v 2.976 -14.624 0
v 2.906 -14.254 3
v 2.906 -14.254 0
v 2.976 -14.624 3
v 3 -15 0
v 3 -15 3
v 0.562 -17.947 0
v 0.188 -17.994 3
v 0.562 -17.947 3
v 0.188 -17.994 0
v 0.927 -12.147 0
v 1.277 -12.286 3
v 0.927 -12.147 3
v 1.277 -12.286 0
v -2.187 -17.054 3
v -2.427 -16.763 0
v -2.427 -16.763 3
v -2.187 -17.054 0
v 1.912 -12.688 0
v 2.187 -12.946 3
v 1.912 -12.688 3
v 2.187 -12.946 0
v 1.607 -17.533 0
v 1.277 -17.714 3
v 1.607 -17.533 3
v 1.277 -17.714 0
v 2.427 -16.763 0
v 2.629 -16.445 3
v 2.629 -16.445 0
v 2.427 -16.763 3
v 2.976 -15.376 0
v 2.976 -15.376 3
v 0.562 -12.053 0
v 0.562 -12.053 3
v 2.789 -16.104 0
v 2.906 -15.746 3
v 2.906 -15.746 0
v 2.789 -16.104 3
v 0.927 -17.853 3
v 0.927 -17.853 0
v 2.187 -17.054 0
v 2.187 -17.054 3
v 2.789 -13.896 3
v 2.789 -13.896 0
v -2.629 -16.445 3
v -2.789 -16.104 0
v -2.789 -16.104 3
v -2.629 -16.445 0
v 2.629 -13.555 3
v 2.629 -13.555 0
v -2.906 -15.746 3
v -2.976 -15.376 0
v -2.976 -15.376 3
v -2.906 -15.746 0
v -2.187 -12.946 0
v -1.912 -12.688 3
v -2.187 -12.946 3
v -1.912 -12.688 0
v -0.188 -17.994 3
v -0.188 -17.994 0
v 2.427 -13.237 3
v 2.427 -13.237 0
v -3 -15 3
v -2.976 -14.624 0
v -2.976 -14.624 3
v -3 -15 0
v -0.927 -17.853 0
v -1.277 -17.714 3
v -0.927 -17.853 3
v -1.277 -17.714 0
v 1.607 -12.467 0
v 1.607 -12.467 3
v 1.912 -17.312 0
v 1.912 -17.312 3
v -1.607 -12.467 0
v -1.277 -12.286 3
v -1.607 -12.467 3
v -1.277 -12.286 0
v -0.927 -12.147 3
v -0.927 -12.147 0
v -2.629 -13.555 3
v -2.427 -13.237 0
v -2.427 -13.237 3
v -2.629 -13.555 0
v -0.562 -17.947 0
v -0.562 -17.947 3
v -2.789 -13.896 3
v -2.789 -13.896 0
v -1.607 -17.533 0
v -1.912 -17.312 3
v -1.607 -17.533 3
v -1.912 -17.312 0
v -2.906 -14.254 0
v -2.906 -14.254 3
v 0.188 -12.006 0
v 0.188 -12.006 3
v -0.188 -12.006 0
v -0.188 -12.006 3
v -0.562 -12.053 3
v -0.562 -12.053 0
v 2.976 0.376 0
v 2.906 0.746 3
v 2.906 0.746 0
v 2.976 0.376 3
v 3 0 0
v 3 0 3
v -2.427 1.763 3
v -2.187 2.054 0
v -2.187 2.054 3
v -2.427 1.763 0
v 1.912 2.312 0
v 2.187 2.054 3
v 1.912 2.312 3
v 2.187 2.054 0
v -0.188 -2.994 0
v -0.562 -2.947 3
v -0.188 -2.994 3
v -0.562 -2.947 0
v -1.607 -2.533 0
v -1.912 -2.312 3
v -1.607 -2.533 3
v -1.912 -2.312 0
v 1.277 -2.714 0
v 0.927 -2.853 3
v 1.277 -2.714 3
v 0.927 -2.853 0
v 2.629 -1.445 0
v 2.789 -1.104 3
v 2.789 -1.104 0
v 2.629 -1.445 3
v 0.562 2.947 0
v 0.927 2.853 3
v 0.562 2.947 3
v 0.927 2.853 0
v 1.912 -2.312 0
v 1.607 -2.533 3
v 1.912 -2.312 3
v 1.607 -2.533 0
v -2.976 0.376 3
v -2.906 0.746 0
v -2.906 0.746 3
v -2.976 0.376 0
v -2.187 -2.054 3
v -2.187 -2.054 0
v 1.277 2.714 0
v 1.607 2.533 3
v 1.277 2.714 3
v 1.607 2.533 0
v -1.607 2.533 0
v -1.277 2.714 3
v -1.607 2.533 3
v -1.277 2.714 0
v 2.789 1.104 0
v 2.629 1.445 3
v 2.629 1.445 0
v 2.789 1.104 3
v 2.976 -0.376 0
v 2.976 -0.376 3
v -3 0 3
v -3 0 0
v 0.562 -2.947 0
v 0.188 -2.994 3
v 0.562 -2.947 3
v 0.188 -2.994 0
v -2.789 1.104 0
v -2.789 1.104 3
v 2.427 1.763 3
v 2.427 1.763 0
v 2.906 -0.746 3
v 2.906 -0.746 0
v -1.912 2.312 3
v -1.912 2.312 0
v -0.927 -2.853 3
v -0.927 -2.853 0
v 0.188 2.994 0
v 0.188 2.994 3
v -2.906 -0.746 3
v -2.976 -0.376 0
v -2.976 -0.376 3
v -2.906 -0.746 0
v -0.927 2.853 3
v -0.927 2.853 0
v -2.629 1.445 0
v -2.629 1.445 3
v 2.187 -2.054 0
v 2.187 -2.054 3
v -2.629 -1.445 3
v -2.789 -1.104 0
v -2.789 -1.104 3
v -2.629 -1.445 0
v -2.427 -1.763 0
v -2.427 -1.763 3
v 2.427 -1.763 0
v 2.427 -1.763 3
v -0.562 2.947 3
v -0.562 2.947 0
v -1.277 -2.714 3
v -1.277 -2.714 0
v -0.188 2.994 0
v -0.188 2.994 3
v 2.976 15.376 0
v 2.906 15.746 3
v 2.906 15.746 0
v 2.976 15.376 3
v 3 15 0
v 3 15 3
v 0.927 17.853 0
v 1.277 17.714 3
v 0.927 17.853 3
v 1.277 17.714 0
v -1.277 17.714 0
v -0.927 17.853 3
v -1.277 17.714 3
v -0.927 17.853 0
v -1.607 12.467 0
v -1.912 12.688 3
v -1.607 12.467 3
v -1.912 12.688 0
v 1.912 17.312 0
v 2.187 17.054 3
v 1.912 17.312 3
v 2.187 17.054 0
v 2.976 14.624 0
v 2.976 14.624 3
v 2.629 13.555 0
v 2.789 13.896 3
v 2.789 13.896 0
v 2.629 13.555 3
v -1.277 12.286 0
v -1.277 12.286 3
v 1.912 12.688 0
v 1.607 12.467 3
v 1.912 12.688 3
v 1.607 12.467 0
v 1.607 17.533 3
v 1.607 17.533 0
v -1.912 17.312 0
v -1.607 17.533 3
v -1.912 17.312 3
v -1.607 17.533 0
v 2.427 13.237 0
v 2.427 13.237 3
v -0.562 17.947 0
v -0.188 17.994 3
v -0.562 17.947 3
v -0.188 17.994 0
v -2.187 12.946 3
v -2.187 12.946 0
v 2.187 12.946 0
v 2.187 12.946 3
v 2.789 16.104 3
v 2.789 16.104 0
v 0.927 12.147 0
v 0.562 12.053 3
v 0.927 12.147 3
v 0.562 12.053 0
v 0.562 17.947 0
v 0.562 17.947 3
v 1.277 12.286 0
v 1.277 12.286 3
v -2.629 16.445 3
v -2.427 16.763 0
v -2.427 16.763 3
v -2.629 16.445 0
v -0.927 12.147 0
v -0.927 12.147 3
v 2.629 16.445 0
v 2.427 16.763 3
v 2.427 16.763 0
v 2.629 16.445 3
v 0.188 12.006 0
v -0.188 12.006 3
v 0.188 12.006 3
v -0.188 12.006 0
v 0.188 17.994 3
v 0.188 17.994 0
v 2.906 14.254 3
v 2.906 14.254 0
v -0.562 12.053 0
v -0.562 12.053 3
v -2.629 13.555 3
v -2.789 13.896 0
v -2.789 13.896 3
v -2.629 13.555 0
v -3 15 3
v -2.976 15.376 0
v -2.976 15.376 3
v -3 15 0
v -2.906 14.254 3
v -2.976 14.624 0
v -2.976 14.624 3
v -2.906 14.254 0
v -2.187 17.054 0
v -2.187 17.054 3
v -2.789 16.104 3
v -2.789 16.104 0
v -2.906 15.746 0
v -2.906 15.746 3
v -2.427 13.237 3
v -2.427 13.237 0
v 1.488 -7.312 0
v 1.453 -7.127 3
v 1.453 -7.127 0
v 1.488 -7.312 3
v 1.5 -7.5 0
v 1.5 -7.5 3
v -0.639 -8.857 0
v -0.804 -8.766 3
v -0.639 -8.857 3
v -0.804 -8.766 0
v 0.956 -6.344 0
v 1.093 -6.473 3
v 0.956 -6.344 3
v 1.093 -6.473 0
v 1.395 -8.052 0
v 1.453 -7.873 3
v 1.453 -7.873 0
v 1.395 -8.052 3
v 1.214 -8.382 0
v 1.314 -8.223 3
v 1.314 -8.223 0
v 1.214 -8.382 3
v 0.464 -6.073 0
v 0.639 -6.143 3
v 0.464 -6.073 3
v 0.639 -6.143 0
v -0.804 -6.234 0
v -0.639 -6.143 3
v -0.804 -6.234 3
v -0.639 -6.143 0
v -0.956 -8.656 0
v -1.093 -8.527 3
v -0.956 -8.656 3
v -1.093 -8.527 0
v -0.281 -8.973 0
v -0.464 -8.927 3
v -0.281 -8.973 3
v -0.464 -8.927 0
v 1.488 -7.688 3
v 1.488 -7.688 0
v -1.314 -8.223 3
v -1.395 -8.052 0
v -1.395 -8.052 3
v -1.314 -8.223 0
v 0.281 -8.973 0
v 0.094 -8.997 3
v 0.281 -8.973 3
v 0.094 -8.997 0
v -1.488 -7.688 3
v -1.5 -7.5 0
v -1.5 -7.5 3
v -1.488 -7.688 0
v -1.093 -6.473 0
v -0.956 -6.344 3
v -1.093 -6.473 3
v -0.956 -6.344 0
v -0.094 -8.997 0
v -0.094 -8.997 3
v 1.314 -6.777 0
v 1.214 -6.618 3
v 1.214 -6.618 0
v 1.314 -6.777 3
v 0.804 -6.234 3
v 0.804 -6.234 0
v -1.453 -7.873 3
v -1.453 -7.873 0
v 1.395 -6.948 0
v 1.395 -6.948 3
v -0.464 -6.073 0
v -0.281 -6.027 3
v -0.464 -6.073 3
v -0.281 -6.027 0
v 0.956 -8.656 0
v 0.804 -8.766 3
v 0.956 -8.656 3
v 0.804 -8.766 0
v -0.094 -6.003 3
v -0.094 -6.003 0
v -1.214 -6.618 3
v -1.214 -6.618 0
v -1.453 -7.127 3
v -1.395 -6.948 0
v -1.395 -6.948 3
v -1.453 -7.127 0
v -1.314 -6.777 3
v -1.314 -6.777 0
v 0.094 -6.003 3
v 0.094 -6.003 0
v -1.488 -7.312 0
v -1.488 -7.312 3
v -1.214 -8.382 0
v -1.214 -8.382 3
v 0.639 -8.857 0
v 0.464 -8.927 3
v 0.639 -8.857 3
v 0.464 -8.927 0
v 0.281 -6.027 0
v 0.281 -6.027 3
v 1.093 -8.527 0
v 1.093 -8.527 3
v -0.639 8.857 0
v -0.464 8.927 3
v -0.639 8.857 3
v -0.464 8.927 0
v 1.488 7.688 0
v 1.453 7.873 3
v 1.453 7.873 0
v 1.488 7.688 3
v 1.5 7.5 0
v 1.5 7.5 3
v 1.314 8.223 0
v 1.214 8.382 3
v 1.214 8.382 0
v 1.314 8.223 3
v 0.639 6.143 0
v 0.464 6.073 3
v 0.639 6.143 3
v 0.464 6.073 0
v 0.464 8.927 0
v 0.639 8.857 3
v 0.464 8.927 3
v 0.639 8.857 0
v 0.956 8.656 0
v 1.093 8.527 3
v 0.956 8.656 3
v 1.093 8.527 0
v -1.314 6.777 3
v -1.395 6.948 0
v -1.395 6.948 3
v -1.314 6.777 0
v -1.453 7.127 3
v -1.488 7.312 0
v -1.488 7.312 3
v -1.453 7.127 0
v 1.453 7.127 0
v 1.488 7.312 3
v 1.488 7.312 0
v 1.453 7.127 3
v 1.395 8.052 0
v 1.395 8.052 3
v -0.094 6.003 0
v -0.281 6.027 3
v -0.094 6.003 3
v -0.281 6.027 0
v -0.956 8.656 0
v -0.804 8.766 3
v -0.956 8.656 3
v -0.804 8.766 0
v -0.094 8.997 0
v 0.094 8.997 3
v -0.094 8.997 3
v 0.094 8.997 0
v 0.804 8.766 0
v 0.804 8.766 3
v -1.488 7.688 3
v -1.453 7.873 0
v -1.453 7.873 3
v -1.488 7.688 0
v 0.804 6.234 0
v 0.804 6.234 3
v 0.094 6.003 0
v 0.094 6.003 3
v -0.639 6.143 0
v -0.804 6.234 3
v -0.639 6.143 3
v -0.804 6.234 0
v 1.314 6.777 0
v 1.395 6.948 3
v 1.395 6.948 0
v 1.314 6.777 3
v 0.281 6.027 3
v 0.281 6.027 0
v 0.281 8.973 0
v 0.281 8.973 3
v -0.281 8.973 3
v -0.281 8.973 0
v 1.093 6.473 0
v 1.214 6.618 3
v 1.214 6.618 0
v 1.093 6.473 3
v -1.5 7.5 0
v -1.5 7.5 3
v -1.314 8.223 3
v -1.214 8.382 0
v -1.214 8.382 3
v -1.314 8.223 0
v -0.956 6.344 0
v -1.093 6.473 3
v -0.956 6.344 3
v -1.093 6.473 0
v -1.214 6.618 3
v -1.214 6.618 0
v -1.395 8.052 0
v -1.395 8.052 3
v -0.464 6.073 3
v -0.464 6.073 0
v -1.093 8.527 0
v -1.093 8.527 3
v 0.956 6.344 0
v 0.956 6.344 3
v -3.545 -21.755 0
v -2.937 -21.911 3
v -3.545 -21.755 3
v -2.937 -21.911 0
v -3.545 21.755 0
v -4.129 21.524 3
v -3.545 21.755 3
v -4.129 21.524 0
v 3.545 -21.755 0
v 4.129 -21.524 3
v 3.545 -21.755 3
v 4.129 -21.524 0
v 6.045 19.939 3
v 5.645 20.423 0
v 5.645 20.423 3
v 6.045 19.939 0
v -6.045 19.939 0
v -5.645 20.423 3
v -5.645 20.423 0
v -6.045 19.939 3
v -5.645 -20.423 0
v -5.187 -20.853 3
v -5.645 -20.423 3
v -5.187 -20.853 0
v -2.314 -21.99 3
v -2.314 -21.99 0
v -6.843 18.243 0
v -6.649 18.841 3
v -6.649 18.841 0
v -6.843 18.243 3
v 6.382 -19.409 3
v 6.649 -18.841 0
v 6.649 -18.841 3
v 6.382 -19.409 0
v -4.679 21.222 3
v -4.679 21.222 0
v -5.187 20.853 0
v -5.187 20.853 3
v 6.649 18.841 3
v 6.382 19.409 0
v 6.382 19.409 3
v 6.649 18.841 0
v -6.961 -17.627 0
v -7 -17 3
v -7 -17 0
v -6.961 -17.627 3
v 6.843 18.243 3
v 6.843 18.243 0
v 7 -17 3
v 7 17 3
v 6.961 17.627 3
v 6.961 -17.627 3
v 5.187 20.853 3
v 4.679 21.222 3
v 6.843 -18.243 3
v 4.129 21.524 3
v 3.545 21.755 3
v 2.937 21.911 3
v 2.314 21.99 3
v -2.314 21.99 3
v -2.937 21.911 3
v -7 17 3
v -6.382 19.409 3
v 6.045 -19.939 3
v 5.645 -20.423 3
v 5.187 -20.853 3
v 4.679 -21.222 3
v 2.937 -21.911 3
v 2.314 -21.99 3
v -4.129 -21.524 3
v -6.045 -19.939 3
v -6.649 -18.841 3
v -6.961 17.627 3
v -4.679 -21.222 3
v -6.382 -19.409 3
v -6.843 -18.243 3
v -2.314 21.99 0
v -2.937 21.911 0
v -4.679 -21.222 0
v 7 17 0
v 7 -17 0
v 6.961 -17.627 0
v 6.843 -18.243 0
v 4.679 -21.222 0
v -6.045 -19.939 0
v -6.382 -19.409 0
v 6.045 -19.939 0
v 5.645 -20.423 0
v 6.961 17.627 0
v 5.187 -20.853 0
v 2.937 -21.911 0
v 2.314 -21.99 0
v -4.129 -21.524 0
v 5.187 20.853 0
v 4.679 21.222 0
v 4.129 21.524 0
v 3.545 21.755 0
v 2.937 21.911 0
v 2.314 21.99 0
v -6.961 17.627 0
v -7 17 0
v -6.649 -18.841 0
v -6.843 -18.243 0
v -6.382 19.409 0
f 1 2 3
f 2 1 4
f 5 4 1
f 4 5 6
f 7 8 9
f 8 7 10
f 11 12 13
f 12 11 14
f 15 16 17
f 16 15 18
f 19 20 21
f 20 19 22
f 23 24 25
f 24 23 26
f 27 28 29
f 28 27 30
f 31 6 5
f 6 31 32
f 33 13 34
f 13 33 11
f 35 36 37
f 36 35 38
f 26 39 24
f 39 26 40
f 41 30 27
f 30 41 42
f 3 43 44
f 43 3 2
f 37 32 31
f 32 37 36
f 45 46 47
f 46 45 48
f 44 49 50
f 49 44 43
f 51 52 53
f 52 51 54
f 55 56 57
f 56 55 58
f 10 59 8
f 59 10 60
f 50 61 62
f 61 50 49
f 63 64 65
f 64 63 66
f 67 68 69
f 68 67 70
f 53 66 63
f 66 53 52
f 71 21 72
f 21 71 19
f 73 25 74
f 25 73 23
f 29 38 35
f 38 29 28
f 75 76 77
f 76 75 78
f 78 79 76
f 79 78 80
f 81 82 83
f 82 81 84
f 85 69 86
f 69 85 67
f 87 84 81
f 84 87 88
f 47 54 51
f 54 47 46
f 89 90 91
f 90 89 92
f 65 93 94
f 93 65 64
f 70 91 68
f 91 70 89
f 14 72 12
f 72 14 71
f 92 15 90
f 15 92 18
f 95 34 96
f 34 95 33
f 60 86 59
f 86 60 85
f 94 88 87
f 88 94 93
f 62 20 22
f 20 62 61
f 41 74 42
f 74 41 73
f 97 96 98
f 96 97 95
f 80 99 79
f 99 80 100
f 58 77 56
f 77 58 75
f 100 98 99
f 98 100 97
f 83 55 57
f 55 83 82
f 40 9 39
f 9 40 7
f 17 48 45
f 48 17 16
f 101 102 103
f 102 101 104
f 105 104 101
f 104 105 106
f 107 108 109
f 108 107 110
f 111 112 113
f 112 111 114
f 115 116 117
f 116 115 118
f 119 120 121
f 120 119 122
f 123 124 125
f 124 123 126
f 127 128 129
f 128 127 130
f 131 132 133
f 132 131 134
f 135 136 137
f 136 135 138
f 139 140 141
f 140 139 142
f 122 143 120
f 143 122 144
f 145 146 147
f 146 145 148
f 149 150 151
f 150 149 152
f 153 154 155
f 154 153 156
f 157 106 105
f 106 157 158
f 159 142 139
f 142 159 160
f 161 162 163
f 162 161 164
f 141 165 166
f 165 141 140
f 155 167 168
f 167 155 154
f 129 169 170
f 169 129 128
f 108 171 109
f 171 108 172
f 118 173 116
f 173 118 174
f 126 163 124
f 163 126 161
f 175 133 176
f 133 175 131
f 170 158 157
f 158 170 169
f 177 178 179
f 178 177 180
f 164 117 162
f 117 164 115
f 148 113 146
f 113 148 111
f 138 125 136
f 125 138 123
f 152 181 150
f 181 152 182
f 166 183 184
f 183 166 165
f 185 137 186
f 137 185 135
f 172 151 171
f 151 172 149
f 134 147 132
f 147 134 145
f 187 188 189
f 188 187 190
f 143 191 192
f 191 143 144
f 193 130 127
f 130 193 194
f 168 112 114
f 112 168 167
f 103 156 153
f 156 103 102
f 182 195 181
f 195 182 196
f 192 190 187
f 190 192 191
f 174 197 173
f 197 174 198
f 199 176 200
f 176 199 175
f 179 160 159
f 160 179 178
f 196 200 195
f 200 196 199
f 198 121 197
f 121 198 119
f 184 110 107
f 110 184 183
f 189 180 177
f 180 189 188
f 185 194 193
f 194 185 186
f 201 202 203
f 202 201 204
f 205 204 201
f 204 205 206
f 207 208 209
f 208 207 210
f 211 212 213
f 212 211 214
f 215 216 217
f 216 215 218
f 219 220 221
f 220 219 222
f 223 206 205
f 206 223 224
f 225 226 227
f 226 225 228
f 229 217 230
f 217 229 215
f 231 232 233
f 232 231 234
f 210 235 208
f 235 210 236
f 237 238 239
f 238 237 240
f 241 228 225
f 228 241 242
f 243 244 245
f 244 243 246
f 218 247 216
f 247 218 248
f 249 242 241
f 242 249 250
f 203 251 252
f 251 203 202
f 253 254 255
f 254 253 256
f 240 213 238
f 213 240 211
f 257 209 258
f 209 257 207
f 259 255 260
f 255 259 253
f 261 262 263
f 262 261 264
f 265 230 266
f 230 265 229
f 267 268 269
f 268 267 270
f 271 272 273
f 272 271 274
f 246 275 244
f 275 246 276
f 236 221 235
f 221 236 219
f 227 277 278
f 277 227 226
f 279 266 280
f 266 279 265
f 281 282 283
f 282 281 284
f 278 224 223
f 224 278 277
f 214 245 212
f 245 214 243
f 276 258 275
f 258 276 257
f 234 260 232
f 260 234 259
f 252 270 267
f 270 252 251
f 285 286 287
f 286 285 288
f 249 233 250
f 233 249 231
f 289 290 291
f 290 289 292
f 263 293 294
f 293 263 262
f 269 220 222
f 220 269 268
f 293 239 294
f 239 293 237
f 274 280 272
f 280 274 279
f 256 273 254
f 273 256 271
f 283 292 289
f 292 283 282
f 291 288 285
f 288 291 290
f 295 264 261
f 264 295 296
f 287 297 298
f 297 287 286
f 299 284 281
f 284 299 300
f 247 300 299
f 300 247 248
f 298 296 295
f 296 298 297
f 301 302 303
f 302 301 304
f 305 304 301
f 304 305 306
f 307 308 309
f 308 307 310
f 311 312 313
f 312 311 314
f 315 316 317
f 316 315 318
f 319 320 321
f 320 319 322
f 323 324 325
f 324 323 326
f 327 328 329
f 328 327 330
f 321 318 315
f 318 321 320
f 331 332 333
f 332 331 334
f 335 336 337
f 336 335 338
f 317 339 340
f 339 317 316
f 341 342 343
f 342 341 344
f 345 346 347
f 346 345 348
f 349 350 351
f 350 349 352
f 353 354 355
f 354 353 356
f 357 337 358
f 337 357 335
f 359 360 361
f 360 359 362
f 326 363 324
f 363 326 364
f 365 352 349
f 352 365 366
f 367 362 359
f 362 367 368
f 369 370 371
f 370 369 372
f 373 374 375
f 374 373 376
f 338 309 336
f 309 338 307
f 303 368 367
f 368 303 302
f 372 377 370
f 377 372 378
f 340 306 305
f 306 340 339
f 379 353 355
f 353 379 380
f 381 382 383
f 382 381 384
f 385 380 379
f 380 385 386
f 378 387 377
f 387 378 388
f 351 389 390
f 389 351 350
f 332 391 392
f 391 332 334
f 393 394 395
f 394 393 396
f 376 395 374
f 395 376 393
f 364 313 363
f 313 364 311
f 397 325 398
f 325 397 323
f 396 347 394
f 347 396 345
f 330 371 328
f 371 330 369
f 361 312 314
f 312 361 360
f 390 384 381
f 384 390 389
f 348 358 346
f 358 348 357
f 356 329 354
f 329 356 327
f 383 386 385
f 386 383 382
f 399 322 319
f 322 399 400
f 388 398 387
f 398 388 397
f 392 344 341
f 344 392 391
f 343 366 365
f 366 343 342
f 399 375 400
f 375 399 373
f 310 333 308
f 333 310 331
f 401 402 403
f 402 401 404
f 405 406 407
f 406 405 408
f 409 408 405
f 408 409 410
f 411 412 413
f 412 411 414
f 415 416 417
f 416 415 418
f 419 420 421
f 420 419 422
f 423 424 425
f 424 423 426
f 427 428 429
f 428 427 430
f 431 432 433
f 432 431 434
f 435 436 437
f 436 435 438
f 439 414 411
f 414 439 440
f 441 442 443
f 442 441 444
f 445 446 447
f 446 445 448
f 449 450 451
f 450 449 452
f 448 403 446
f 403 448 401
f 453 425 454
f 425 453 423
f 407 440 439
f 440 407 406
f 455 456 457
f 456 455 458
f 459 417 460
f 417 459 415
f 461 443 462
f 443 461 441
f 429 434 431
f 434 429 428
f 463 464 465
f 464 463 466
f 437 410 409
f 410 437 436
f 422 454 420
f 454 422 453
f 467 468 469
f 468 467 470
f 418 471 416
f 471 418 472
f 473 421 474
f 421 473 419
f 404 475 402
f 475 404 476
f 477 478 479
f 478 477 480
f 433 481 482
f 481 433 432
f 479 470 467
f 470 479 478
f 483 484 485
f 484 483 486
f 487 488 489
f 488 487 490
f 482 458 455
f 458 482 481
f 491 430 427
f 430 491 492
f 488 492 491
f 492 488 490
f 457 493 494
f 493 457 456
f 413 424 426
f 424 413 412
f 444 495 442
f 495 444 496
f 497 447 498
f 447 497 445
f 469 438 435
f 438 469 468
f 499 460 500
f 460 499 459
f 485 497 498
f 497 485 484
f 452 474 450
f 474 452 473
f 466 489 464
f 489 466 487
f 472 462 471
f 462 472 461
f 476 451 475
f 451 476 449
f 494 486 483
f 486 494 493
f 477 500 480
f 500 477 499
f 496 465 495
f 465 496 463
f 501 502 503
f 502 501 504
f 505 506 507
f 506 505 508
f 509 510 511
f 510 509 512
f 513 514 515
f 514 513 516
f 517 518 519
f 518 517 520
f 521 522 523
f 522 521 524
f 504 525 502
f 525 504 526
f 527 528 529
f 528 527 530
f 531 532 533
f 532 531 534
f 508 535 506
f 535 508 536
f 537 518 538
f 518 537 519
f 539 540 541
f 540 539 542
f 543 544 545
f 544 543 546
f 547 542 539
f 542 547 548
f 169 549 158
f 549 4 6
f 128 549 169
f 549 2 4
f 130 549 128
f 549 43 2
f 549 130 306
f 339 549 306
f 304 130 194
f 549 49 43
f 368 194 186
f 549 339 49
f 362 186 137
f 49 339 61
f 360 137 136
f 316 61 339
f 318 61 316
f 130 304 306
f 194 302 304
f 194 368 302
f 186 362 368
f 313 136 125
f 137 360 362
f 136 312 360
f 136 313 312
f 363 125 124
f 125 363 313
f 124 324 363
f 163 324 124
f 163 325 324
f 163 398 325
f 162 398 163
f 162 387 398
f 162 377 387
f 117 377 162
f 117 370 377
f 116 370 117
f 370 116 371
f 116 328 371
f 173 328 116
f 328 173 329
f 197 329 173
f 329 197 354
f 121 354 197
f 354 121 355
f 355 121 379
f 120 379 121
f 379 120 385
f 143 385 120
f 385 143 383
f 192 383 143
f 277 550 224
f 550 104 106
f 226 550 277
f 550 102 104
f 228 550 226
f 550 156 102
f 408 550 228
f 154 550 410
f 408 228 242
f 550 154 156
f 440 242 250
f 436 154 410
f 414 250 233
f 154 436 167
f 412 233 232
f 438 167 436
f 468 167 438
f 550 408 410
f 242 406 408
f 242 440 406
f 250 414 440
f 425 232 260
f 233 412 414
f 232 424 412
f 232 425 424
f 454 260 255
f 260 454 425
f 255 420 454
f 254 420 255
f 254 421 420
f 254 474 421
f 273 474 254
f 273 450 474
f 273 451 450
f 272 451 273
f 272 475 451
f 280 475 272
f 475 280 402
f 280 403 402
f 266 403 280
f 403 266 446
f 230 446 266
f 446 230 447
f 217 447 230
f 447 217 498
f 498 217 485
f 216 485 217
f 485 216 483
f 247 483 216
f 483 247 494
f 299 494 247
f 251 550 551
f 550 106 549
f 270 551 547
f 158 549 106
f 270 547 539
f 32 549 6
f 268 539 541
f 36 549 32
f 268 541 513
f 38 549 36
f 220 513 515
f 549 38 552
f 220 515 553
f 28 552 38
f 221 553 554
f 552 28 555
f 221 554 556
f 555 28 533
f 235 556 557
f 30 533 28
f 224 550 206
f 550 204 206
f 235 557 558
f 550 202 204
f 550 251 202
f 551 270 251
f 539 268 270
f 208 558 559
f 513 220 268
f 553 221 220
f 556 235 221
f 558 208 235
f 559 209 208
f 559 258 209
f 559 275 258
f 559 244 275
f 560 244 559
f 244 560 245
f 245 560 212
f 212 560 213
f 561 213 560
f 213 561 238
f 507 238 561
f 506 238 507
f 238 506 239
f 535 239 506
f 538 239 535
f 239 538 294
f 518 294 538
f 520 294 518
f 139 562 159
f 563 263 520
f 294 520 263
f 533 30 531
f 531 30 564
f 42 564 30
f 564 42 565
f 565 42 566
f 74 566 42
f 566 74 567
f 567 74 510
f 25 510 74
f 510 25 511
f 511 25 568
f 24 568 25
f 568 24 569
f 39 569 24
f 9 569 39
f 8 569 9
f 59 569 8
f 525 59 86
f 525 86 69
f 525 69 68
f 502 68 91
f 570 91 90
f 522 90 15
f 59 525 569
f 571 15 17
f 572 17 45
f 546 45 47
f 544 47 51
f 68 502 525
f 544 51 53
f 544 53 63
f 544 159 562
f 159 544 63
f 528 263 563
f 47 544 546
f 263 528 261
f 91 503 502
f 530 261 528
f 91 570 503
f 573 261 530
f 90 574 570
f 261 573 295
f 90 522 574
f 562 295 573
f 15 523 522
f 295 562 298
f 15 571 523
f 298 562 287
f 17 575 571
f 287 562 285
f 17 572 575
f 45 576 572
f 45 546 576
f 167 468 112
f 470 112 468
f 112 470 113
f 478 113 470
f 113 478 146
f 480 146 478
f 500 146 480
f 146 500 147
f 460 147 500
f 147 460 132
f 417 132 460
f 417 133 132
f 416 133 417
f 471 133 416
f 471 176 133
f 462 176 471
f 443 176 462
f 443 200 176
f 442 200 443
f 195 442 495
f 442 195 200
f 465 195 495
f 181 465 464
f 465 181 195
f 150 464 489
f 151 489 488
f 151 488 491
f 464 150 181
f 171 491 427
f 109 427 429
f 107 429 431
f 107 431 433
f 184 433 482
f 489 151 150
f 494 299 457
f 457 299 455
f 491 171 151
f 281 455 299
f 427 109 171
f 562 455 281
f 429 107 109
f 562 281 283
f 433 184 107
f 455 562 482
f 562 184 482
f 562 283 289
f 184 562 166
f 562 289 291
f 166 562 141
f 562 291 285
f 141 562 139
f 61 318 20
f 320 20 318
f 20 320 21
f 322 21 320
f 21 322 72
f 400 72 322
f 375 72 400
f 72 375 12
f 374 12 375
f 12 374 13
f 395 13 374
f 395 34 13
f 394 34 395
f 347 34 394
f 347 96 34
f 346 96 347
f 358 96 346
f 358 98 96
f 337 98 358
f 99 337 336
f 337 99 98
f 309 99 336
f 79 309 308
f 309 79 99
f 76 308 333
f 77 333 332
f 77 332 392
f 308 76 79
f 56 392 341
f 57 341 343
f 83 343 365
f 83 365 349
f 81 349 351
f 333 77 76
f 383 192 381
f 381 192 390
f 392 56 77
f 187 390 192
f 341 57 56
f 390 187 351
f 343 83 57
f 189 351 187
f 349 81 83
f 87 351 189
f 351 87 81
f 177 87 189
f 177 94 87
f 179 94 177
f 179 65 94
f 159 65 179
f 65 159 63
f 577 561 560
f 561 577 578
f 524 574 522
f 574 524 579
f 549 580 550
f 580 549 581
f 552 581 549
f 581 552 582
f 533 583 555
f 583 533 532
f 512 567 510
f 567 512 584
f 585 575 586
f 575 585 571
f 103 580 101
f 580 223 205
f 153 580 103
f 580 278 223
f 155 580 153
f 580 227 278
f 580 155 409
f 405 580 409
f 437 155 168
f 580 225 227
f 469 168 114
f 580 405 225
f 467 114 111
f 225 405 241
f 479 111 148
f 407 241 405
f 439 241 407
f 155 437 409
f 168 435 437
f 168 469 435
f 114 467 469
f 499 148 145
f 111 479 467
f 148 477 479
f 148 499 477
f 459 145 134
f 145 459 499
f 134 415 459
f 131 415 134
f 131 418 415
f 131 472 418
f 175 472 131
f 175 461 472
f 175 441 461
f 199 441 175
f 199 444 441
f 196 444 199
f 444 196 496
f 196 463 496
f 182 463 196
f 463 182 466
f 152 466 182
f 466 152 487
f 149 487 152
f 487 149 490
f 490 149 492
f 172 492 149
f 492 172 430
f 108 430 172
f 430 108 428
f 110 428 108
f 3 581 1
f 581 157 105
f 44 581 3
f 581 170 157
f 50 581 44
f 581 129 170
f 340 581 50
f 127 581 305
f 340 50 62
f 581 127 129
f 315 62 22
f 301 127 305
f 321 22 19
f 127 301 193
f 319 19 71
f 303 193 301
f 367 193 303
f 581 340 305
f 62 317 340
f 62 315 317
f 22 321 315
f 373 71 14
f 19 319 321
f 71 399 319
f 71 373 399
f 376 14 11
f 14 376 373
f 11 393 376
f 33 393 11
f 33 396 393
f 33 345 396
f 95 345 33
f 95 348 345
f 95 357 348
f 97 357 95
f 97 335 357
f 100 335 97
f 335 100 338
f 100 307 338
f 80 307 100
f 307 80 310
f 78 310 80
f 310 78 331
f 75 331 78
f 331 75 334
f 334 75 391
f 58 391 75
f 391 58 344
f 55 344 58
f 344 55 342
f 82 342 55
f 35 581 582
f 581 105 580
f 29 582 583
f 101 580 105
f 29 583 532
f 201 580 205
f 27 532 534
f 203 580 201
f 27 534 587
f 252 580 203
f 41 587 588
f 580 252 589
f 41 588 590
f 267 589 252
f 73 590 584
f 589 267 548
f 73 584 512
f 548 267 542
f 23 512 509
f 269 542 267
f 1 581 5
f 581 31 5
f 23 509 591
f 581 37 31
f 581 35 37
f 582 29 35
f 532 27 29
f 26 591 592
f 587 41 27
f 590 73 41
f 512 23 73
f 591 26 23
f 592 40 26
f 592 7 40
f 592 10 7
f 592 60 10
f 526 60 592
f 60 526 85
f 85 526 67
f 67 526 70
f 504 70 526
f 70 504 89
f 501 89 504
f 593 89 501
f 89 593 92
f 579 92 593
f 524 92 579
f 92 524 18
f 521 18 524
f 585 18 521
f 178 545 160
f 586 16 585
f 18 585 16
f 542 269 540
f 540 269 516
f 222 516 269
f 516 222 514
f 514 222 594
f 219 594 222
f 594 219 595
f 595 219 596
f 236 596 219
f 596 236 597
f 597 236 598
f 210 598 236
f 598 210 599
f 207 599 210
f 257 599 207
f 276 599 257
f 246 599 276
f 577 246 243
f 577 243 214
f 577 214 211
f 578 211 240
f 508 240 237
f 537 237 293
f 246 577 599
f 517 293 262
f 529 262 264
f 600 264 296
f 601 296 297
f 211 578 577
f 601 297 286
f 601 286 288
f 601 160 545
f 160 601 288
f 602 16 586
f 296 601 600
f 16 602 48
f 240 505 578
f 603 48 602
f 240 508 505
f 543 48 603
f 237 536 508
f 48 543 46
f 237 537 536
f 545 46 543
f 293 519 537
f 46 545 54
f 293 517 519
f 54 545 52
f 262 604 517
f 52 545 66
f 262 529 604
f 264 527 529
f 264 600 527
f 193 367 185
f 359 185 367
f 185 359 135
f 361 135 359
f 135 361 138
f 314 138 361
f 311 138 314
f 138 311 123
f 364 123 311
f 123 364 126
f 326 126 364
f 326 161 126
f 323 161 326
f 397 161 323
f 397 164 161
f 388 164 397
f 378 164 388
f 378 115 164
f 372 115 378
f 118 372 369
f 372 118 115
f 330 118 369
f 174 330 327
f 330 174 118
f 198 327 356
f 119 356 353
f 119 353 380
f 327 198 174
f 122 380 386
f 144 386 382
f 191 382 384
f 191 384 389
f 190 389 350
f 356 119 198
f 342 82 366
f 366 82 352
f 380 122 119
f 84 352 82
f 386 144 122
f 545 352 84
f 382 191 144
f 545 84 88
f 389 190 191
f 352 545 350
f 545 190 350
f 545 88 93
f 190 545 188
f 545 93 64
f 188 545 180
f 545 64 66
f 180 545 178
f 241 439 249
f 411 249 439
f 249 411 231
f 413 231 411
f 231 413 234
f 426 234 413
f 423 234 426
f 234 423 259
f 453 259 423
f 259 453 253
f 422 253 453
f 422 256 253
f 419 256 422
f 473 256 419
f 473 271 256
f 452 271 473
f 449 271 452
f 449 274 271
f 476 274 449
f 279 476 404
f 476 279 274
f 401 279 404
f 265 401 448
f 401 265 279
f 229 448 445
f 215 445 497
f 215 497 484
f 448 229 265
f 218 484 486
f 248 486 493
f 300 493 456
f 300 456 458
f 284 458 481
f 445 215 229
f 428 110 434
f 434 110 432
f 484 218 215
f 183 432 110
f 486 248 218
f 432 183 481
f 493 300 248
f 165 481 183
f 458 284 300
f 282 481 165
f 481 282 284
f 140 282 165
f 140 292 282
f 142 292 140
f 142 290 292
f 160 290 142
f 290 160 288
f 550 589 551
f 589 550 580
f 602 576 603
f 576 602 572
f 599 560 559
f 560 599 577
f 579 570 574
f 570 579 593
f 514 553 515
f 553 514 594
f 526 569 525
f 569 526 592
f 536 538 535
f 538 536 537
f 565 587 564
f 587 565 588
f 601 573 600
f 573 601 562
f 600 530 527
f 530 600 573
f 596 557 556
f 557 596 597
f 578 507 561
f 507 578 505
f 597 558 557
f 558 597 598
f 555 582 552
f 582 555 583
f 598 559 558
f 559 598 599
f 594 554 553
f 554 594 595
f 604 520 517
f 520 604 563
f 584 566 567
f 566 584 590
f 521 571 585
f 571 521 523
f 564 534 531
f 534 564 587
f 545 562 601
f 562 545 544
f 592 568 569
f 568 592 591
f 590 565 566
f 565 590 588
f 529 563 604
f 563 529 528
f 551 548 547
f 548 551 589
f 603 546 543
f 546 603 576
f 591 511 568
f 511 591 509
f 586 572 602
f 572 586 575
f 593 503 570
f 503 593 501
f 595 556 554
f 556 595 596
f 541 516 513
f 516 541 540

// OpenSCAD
$fn = 50;

difference() {
	union() {
		hull() {
			translate(v = [-2.0, 17.0, 0]) {
				cylinder(h = 3, r = 5);
			}
			translate(v = [2.0, 17.0, 0]) {
				cylinder(h = 3, r = 5);
			}
			translate(v = [-2.0, -17.0, 0]) {
				cylinder(h = 3, r = 5);
			}
			translate(v = [2.0, -17.0, 0]) {
				cylinder(h = 3, r = 5);
			}
		}
	}
	union() {
		translate(v = [0.0, -15.0, 0]) {
			translate(v = [0, 0, -100]) {
				cylinder(h = 200, r = 3.0);
			}
		}
		translate(v = [0, 0, -100]) {
			cylinder(h = 200, r = 3.0);
		}
		translate(v = [0.0, 15.0, 0]) {
			translate(v = [0, 0, -100]) {
				cylinder(h = 200, r = 3.0);
			}
		}
		translate(v = [0.0, -15.0, 0]) {
			translate(v = [0, 0, -100]) {
				cylinder(h = 200, r = 1.5);
			}
		}
		translate(v = [0.0, -7.5, 0]) {
			translate(v = [0, 0, -100]) {
				cylinder(h = 200, r = 1.5);
			}
		}
		translate(v = [0, 0, -100]) {
			cylinder(h = 200, r = 1.5);
		}
		translate(v = [0.0, 7.5, 0]) {
			translate(v = [0, 0, -100]) {
				cylinder(h = 200, r = 1.5);
			}
		}
		translate(v = [0.0, 15.0, 0]) {
			translate(v = [0, 0, -100]) {
				cylinder(h = 200, r = 1.5);
			}
		}
	}
}
